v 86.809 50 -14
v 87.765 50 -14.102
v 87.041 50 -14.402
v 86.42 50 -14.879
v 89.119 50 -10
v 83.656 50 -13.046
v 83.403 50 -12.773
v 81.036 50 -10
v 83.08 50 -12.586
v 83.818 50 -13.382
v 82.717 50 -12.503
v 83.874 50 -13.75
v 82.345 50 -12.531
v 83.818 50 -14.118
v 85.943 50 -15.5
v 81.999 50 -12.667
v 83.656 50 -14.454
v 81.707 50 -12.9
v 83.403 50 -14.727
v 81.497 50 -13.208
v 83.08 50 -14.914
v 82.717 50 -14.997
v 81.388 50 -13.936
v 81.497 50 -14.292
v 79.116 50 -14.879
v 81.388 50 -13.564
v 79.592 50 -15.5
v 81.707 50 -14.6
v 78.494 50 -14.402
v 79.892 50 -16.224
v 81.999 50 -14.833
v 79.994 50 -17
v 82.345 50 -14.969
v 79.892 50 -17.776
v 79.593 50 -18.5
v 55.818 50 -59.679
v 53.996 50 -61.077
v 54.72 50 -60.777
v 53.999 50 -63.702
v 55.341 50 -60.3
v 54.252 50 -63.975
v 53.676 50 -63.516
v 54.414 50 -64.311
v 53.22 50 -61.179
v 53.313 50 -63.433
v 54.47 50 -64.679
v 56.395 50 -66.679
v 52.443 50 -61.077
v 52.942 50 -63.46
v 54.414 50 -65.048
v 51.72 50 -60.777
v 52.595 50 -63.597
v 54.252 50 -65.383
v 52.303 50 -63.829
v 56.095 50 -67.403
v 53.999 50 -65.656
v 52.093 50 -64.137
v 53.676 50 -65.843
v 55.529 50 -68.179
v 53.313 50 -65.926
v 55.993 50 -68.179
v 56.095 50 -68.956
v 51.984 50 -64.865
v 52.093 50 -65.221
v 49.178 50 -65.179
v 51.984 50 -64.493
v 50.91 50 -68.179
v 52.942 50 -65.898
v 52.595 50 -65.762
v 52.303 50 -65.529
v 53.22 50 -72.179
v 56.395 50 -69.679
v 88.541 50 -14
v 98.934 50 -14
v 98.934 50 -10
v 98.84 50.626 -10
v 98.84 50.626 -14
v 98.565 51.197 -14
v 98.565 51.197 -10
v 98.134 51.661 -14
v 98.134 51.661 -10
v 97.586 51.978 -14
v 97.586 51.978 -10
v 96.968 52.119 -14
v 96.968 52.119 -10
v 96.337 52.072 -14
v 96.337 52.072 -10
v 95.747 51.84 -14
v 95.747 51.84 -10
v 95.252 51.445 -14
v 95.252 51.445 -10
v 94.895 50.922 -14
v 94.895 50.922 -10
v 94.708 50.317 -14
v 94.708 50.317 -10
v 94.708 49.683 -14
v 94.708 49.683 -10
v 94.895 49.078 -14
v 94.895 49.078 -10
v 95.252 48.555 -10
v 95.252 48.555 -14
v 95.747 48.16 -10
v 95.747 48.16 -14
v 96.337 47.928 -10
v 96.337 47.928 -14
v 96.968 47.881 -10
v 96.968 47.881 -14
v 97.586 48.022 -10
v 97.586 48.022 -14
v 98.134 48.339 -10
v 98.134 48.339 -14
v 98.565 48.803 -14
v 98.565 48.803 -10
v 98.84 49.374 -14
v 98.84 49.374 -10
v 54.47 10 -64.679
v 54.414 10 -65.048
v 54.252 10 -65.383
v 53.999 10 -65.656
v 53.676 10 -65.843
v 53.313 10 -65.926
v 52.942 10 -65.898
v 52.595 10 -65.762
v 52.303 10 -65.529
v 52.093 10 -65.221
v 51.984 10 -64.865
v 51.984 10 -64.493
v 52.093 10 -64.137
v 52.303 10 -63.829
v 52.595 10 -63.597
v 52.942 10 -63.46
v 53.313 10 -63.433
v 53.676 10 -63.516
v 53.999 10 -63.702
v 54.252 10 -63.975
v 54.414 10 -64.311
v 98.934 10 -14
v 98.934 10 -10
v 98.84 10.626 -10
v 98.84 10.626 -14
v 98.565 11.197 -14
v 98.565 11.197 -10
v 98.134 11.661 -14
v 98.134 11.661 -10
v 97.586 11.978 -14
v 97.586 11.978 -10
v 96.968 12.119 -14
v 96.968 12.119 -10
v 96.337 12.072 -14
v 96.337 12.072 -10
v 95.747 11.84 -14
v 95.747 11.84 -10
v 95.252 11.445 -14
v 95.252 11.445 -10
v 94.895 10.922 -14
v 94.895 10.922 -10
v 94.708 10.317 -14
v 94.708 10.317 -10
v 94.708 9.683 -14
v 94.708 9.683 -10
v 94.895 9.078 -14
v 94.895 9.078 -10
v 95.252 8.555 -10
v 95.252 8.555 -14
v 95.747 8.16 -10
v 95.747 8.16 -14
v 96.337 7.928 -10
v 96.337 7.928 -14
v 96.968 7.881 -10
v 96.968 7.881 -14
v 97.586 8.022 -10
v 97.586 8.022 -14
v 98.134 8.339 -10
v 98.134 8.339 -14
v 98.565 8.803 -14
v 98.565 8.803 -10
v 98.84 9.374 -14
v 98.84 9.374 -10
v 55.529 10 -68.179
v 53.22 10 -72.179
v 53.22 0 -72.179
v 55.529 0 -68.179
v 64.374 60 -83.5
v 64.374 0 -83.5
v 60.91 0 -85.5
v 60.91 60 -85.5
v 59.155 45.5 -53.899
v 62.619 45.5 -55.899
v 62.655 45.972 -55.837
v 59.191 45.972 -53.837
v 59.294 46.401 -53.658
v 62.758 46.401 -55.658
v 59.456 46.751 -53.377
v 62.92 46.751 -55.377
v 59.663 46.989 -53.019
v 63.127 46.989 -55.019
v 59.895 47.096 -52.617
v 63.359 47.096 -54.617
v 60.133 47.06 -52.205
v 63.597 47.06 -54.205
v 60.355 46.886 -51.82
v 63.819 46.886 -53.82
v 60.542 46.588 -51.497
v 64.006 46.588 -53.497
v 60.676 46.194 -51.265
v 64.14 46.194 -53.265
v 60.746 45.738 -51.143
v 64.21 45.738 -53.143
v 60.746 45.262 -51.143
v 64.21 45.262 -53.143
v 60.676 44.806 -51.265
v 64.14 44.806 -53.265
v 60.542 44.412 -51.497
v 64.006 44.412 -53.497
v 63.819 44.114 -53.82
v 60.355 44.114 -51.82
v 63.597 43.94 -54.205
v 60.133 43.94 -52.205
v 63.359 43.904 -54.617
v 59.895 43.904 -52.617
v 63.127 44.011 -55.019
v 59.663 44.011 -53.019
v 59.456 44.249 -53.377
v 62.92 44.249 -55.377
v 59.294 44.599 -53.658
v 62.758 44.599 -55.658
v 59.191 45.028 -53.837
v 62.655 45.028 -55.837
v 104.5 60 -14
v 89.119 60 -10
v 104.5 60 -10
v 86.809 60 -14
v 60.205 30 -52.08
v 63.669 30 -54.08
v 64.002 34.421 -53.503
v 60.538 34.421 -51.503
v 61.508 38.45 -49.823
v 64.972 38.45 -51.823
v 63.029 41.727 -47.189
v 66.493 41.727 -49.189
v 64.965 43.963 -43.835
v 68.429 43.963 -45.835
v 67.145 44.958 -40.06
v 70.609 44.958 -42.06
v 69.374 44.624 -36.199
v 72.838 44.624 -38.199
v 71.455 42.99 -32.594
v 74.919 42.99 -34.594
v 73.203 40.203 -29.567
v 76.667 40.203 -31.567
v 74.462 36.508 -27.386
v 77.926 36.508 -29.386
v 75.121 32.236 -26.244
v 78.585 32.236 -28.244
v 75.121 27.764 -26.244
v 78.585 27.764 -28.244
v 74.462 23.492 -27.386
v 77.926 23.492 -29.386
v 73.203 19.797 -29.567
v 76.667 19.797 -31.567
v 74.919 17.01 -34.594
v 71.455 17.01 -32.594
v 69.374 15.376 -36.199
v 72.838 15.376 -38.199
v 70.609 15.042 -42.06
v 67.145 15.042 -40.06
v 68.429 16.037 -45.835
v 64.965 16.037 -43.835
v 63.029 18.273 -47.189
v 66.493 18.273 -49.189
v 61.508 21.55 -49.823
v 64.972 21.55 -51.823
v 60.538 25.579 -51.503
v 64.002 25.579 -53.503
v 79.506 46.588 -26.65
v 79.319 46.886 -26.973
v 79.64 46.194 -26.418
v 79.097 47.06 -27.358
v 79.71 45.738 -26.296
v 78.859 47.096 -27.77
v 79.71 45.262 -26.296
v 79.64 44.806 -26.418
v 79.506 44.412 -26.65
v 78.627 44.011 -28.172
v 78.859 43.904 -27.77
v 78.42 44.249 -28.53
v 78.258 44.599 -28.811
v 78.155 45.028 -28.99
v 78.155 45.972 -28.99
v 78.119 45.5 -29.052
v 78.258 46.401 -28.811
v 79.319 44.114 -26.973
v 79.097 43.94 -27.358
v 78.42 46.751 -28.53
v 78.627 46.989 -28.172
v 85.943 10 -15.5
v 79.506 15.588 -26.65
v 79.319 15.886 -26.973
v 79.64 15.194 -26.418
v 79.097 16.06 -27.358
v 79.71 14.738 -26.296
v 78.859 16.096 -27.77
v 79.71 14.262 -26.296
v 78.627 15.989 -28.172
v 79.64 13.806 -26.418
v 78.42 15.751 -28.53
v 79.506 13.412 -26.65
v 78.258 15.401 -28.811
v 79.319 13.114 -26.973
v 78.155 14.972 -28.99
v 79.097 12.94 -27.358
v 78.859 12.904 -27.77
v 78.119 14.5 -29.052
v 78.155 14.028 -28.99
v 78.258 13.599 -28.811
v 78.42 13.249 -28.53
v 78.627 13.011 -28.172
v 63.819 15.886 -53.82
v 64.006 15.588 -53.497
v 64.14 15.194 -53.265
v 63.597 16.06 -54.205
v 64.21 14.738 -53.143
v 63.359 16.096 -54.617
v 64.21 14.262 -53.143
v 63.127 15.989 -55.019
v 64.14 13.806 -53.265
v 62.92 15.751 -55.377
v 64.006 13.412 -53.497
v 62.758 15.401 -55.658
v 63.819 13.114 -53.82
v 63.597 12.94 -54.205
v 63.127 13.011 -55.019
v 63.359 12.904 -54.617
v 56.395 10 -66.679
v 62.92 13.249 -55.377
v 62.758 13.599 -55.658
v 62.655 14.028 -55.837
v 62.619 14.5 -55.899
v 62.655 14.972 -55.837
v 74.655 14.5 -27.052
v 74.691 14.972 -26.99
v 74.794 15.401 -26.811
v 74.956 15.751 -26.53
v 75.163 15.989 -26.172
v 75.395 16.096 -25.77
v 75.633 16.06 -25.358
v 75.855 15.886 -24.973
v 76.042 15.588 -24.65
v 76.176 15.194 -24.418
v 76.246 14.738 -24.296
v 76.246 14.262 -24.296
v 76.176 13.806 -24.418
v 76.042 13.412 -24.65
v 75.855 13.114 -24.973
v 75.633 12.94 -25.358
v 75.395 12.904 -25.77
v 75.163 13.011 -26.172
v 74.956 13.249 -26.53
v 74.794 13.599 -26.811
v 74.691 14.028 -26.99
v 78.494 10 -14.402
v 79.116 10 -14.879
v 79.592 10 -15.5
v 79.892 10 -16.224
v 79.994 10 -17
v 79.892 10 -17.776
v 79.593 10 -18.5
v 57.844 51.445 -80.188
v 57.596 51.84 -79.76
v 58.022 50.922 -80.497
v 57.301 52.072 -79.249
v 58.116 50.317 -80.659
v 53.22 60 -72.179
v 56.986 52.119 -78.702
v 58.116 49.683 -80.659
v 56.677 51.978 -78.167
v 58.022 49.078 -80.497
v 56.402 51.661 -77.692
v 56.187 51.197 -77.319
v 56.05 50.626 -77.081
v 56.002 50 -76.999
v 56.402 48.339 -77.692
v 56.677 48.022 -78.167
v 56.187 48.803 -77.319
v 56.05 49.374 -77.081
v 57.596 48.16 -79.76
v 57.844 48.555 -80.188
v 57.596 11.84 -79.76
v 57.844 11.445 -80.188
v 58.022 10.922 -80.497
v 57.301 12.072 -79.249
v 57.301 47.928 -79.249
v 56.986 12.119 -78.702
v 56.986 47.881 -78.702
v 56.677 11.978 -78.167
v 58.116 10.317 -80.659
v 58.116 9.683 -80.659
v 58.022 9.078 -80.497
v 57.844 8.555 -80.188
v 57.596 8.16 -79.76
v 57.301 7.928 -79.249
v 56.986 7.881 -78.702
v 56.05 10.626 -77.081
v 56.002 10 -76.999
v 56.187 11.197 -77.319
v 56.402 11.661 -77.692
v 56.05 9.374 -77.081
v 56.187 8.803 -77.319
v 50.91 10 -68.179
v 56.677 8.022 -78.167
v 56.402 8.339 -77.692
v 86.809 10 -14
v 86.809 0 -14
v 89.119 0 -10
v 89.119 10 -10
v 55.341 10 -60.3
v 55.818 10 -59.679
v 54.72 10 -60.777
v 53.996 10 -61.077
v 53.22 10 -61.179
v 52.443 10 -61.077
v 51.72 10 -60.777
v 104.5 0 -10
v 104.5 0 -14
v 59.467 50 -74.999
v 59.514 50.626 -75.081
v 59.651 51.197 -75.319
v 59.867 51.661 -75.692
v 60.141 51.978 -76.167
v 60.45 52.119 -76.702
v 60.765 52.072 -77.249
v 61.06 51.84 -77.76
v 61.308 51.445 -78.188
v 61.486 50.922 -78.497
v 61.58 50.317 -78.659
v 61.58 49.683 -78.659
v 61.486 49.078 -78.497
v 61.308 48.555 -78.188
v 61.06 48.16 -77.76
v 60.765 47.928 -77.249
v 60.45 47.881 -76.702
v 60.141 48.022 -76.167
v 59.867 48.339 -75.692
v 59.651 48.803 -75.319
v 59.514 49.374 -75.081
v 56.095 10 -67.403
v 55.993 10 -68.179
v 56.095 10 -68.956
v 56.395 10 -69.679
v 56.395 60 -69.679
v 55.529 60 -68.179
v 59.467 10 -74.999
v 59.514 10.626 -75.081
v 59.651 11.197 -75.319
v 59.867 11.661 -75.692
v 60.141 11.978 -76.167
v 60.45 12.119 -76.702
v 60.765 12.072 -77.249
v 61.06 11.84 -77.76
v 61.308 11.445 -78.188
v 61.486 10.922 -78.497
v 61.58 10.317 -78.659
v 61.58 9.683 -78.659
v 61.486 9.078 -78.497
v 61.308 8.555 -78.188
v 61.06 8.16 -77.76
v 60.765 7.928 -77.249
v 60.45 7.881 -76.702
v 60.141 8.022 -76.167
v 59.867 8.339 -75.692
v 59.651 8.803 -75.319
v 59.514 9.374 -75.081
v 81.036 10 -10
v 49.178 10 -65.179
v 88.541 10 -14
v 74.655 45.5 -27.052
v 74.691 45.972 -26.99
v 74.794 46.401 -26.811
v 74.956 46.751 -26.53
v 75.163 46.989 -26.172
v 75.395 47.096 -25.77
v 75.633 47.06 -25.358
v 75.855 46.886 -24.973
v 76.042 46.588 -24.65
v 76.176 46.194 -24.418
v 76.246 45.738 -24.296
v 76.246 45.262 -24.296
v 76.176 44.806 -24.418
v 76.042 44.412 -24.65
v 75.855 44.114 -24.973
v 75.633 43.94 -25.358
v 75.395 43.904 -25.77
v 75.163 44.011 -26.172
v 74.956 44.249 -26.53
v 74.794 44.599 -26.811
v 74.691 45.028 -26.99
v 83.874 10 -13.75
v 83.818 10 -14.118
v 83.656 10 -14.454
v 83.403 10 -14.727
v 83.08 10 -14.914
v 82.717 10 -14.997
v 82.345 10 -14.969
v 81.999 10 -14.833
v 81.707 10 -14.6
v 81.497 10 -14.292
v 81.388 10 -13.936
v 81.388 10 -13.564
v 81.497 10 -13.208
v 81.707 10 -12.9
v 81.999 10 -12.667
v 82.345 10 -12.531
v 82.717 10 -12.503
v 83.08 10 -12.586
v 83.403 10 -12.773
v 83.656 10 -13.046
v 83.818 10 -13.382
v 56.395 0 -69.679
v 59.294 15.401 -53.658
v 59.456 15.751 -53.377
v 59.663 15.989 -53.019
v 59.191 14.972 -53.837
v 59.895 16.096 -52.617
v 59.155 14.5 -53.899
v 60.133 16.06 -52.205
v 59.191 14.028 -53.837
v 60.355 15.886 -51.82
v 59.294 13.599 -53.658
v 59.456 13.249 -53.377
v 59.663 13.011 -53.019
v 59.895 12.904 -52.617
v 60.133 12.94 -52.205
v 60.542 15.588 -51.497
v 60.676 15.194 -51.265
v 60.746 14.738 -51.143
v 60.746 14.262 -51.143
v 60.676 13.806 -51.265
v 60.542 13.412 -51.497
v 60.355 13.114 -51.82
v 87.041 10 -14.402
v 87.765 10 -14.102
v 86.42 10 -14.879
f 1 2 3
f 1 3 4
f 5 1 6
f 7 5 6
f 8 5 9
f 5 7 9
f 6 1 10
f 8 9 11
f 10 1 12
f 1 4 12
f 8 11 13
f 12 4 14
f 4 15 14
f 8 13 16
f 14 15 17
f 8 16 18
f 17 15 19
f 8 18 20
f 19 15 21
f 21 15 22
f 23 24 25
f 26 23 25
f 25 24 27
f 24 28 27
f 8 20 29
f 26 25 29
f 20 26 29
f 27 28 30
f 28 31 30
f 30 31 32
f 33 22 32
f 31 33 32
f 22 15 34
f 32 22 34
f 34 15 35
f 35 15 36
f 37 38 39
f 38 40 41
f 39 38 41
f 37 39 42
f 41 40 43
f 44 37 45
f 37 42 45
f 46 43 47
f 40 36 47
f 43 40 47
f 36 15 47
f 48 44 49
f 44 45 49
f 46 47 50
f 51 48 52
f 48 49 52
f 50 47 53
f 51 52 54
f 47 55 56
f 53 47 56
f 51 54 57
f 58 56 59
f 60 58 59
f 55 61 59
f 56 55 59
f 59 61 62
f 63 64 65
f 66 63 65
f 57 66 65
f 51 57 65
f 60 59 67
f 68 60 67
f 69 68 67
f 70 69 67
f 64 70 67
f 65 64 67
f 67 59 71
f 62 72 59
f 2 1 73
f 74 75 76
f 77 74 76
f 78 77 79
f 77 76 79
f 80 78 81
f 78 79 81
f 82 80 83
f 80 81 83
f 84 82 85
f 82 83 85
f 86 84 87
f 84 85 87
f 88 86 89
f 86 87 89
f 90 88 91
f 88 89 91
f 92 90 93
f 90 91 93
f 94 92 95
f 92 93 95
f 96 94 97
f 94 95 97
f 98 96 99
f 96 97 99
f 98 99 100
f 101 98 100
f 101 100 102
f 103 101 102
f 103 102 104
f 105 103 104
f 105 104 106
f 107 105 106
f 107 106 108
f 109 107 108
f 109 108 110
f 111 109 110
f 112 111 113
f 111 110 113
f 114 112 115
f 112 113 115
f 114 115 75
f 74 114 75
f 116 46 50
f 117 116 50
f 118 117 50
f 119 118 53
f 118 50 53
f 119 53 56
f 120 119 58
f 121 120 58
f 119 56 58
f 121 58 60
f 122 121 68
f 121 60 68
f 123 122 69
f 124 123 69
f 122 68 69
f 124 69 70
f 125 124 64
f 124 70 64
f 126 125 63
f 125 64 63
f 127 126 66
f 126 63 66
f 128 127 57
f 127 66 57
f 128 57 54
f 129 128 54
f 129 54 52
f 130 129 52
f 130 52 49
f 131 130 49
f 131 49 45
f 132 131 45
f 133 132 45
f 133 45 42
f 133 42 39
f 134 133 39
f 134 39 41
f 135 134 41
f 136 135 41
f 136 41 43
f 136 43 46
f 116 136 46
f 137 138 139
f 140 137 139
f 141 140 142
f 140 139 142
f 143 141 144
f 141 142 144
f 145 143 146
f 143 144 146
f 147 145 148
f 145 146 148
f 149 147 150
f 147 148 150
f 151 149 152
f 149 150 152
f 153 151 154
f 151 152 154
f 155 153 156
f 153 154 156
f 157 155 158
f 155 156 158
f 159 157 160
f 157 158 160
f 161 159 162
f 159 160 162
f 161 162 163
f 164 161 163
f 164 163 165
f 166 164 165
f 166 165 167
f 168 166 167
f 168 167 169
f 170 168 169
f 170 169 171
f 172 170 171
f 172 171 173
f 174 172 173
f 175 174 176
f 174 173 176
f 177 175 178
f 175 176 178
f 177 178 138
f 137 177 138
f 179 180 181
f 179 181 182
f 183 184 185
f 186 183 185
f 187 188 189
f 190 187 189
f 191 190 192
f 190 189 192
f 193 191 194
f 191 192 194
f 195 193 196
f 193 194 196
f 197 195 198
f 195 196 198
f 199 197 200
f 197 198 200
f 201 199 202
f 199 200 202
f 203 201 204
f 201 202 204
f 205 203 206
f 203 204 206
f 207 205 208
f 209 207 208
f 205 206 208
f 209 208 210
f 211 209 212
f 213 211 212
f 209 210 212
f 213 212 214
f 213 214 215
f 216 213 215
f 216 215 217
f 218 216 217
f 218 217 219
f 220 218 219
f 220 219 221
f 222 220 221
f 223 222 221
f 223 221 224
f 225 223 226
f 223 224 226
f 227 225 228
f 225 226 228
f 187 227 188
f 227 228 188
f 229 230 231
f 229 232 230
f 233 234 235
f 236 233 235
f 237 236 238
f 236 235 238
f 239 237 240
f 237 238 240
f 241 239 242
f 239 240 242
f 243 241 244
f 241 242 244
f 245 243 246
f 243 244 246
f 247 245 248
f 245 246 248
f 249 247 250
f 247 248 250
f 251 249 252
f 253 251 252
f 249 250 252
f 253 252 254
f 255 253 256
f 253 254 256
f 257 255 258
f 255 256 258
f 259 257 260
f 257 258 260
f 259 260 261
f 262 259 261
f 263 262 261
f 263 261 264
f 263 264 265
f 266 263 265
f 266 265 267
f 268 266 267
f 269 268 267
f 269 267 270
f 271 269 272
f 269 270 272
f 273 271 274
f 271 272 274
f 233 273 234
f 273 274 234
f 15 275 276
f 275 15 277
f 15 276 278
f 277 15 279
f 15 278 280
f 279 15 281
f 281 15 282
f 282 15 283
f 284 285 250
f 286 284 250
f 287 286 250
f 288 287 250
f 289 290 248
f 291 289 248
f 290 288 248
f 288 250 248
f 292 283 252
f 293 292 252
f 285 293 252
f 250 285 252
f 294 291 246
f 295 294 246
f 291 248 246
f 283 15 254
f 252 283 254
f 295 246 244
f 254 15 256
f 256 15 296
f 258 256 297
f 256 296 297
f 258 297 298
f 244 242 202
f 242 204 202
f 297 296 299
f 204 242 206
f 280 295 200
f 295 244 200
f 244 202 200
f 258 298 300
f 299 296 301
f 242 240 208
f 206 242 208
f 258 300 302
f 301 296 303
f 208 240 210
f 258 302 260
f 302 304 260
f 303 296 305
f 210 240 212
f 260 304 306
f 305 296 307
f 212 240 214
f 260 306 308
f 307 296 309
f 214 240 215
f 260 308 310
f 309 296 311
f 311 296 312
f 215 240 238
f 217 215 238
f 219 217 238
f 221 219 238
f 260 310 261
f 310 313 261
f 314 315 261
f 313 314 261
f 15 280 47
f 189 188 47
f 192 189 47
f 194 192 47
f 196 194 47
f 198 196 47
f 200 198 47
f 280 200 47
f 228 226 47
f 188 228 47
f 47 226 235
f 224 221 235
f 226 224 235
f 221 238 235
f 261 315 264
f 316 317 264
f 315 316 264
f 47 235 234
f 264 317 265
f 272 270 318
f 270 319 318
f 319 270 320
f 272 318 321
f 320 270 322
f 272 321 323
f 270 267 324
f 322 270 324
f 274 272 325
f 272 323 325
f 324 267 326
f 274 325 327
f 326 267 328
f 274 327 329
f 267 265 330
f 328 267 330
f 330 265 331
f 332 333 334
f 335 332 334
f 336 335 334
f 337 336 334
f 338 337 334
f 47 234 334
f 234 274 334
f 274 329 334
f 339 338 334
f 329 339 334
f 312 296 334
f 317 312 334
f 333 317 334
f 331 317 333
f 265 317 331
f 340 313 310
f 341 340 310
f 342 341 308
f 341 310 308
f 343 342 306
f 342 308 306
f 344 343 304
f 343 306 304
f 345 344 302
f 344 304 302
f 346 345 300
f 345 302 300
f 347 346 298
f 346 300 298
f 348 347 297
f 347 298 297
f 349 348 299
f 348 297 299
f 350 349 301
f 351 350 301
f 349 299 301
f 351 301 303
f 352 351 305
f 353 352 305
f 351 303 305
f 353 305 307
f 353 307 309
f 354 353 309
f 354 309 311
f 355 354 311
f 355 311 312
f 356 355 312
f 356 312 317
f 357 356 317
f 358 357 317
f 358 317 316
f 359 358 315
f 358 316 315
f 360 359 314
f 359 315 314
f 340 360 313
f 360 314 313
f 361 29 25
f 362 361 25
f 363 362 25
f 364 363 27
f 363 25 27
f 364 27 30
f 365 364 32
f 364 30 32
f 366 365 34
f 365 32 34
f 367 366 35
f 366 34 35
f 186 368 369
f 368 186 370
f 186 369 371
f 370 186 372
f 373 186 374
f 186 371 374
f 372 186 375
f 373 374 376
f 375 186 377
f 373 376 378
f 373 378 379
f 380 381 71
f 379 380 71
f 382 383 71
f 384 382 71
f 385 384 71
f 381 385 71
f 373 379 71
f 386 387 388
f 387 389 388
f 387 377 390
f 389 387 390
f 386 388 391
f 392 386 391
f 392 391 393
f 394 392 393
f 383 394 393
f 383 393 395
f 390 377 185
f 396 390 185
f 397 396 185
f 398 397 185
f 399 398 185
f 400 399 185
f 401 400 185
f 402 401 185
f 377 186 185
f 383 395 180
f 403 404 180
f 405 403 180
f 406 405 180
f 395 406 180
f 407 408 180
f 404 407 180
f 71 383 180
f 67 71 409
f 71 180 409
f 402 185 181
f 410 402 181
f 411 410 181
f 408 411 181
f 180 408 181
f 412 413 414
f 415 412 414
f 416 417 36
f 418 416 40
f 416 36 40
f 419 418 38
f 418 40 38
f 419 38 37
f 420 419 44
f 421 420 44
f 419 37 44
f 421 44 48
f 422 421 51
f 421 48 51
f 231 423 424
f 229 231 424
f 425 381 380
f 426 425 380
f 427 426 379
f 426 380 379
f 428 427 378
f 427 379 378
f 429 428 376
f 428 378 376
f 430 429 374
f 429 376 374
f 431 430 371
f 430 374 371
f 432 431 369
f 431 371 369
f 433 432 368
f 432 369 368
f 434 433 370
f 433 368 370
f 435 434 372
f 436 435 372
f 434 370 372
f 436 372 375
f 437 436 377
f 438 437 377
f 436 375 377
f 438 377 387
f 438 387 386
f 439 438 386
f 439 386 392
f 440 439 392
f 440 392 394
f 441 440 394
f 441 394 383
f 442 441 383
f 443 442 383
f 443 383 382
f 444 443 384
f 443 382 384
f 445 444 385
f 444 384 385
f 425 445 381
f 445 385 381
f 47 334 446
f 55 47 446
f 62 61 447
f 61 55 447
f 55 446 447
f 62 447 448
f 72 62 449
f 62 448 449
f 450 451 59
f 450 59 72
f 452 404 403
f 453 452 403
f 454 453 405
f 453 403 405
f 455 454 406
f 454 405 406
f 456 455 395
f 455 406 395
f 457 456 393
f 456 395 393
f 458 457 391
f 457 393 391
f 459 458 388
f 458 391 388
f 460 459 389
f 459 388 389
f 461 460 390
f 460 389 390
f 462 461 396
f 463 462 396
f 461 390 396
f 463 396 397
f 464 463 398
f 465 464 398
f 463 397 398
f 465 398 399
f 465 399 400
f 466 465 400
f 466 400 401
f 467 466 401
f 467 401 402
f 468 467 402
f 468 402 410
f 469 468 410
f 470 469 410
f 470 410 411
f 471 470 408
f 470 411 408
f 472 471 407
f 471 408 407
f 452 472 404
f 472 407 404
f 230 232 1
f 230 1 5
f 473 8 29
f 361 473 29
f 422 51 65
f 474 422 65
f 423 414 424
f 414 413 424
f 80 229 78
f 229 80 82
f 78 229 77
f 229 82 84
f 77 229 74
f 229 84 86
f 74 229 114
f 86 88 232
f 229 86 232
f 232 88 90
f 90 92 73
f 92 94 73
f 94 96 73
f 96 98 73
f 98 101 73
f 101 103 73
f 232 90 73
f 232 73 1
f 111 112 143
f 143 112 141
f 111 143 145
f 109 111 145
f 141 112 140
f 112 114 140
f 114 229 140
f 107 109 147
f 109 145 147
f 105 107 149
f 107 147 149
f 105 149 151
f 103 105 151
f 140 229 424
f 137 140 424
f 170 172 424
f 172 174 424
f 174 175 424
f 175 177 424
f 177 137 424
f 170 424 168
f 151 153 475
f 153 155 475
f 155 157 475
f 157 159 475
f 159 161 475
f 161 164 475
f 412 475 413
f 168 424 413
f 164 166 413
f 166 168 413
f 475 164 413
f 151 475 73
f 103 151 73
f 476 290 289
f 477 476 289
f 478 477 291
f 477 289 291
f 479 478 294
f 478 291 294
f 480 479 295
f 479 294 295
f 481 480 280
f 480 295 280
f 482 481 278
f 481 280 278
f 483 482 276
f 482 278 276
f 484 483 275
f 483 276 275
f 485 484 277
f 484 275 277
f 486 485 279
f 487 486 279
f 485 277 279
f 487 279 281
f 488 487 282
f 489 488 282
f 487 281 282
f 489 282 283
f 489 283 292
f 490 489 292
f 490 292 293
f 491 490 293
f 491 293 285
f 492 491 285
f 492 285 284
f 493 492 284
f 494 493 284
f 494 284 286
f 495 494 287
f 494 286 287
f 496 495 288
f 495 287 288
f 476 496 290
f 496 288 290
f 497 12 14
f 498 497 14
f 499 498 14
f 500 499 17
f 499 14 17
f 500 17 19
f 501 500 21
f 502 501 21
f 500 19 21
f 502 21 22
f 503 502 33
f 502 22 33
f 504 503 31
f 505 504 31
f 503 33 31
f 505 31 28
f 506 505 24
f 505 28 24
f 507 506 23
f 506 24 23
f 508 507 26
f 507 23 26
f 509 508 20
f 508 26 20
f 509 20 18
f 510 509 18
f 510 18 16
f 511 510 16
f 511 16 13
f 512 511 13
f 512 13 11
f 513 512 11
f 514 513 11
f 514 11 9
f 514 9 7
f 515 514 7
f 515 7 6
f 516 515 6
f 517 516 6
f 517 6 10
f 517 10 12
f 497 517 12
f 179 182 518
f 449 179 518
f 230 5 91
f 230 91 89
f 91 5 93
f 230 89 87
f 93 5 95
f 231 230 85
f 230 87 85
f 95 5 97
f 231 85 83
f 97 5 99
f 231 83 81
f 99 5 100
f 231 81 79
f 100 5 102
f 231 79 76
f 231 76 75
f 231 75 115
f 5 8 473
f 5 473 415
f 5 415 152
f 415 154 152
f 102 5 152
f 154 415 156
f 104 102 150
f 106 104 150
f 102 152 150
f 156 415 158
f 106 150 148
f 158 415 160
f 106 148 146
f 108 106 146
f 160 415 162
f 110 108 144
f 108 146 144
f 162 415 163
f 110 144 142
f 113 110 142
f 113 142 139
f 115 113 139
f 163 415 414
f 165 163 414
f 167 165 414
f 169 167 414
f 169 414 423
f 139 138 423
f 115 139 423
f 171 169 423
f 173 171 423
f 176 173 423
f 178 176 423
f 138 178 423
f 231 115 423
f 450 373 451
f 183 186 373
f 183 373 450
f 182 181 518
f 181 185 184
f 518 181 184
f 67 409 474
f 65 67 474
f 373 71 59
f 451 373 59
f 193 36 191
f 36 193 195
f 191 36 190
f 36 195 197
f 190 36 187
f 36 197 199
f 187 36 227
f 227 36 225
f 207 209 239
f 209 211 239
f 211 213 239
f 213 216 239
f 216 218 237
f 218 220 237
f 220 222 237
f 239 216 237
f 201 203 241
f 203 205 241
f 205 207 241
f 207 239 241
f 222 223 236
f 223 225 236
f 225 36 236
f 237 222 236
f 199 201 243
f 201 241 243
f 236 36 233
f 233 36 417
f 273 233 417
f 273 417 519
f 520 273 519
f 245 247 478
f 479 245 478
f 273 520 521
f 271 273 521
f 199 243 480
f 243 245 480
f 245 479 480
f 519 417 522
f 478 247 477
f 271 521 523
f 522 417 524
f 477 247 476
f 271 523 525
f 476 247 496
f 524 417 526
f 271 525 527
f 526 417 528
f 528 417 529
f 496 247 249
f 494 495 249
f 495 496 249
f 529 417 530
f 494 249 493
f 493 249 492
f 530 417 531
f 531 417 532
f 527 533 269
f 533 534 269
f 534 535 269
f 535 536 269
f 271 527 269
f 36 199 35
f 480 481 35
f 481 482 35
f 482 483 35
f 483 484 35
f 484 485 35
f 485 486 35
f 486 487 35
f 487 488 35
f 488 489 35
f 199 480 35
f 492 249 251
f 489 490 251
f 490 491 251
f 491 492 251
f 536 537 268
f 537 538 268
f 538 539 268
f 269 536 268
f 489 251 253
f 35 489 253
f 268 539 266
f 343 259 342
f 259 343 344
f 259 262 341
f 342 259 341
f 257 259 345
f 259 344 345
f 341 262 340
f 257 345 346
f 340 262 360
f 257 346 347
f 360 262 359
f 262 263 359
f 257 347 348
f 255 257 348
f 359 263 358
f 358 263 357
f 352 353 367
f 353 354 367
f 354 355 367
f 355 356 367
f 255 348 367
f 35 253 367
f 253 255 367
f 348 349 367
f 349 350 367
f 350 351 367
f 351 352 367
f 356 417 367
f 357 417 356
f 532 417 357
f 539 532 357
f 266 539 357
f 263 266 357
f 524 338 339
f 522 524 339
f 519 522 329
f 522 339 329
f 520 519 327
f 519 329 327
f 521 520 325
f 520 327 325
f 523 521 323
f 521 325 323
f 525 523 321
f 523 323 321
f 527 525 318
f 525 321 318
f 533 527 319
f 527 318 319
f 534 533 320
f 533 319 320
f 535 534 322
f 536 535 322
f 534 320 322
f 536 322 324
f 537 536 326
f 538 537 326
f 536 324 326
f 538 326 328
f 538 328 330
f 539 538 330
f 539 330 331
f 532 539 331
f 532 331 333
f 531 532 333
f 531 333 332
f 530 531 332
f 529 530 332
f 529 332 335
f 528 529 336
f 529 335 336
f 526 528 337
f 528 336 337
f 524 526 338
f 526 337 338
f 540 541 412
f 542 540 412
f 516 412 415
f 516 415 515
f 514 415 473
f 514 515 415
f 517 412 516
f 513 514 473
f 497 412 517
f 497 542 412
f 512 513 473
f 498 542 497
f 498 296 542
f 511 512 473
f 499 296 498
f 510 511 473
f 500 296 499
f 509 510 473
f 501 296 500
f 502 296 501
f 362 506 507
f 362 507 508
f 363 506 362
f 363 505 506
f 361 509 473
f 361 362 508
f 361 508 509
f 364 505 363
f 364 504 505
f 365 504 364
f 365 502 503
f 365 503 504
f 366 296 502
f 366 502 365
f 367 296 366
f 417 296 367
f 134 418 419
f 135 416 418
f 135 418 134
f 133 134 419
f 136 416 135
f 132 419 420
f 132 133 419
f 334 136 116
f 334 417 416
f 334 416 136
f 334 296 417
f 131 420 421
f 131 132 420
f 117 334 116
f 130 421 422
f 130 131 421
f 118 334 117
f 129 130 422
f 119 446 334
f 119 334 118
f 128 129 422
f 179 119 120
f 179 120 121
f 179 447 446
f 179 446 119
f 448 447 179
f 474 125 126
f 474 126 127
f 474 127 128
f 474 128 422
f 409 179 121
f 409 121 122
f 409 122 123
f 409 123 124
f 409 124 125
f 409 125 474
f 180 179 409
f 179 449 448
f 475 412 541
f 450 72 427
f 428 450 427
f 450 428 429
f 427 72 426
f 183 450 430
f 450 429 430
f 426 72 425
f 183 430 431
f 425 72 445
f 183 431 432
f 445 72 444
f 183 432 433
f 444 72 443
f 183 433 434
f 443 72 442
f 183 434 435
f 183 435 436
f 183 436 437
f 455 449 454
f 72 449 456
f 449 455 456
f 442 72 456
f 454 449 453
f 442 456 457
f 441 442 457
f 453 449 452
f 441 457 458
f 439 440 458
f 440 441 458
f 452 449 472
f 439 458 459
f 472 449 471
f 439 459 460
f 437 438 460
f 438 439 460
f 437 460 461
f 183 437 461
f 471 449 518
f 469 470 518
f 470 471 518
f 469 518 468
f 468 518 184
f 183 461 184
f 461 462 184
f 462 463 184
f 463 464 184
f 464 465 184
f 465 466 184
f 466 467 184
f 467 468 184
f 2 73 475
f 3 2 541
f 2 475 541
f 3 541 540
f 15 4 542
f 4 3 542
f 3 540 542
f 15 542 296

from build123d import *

# Parameters (mm, degrees)
BOSS_EXTRUDE4_DEPTH = 60
CUT_EXTRUDE9_DEPTH  = 10
FILLET5_R           = 3
SKETCH13_R          = 1.25
CUT_EXTRUDE10_DEPTH = 51
SKETCH14_R          = 2.125
CUT_EXTRUDE11_DEPTH = 4
SKETCH15_R          = 2.125
CUT_EXTRUDE12_DEPTH = 4
SKETCH16_R          = 15
SKETCH16_R_2        = 1.6
CUT_EXTRUDE13_DEPTH = 4
CUT_EXTRUDE14_DEPTH = 40


with BuildPart() as part:
    # Sketch1 → Boss-Extrude4 (new body)
    with BuildSketch(Plane(origin=(0, 0, 0), x_dir=(1, 0, 0), z_dir=(0, 1, 0))):
        with BuildLine():
            Line((84.5, 10), (104.5, 10))
            Line((104.5, 10), (104.5, 14))
            Line((104.5, 14), (88.541451884, 14))
            ThreePointArc((88.541451884, 14), (87.041451884, 14.401923789), (85.943375673, 15.5))
            Line((85.943375673, 15.5), (56.395081595, 66.67914662))
            ThreePointArc((56.395081595, 66.67914662), (55.993157806, 68.17914662), (56.395081595, 69.67914662))
            Line((56.395081595, 69.67914662), (64.374355653, 83.499654695))
            Line((64.374355653, 83.499654695), (60.910254038, 85.499654695))
            Line((60.910254038, 85.499654695), (50.910254038, 68.17914662))
            Line((50.910254038, 68.17914662), (46.868804038, 61.179149884))
            Line((46.868804038, 61.179149884), (49.178205115, 57.179149884))
            Line((49.178205115, 57.179149884), (53.219655115, 64.17914662))
            Line((53.219655115, 64.17914662), (82.190598923, 14))
            Line((82.190598923, 14), (74.107698923, 14))
            Line((74.107698923, 14), (76.4171, 10))
            Line((76.4171, 10), (84.5, 10))
        make_face()
    extrude(amount=BOSS_EXTRUDE4_DEPTH)

    # Sketch12 → Cut-Extrude9 (cut)
    with BuildSketch(Plane(origin=(0, 60, 0), x_dir=(1, 0, 0), z_dir=(0, 1, 0))):
        with BuildLine():
            Line((89.118802154, 10), (76.4171, 10))
            Line((76.4171, 10), (46.868804038, 61.179149884))
            Line((46.868804038, 61.179149884), (53.219655115, 72.17914662))
            Line((53.219655115, 72.17914662), (55.529056191, 68.17914662))
            Line((55.529056191, 68.17914662), (56.395081595, 69.67914662))
            ThreePointArc((56.395081595, 69.67914662), (55.993157806, 68.17914662), (56.395081595, 66.67914662))
            Line((56.395081595, 66.67914662), (85.943375673, 15.5))
            ThreePointArc((85.943375673, 15.5), (87.041451884, 14.401923789), (88.541451884, 14))
            Line((88.541451884, 14), (86.809401077, 14))
            Line((86.809401077, 14), (89.118802154, 10))
        make_face()
    cut_extrude9 = extrude(amount=-CUT_EXTRUDE9_DEPTH, mode=Mode.SUBTRACT)

    # Mirror4: Cut-Extrude9 across plane
    add(cut_extrude9.mirror(Plane.ZX.offset(30)), mode=Mode.SUBTRACT)

    # Fillet5
    fillet5_edges = [part.edges().sort_by_distance(p)[0] for p in [
        (82.190598923, 30, -14),
        (53.219655115, 30, -64.17914662),
    ]]
    fillet(fillet5_edges, radius=FILLET5_R)

    # Sketch13 → Cut-Extrude10 (cut, through all)
    with BuildSketch(Plane(origin=(0, 50, 0), x_dir=(1, 0, 0), z_dir=(0, 1, 0))):
        with Locations((53.2197, 64.6791)):
            Circle(SKETCH13_R)
        with Locations((82.6236, 13.75)):
            Circle(SKETCH13_R)
    extrude(amount=-CUT_EXTRUDE10_DEPTH, mode=Mode.SUBTRACT)

    # Sketch14 → Cut-Extrude11 (cut)
    with BuildSketch(Plane.XY.offset(-10)):
        with Locations((96.809401077, 50)):
            Circle(SKETCH14_R)
        with Locations((96.809401077, 10)):
            Circle(SKETCH14_R)
    extrude(amount=-CUT_EXTRUDE11_DEPTH, mode=Mode.SUBTRACT)

    # Sketch15 → Cut-Extrude12 (cut)
    with BuildSketch(Plane(origin=(8.660254038, 0, 5), x_dir=(-0.5, 0, 0.866025404), z_dir=(-0.866025404, 0, -0.5))):
        with Locations((-96.809401077, 50)):
            Circle(SKETCH15_R)
        with Locations((-96.809401077, 10)):
            Circle(SKETCH15_R)
    extrude(amount=-CUT_EXTRUDE12_DEPTH, mode=Mode.SUBTRACT)

    # Sketch16 → Cut-Extrude13 (cut)
    with BuildSketch(Plane(origin=(71.169228634, 0, -41.08957331), x_dir=(-0.5, 0, -0.866025404), z_dir=(0.866025404, 0, -0.5))):
        with Locations((0, 30)):
            Circle(SKETCH16_R)
        with Locations((-15.5, 45.5)):
            Circle(SKETCH16_R_2)
        with Locations((15.5, 45.5)):
            Circle(SKETCH16_R_2)
        with Locations((15.5, 14.5)):
            Circle(SKETCH16_R_2)
        with Locations((-15.5, 14.5)):
            Circle(SKETCH16_R_2)
    extrude(amount=-CUT_EXTRUDE13_DEPTH, mode=Mode.SUBTRACT)

    # Sketch17 → Cut-Extrude14 (cut)
    with BuildSketch(Plane(origin=(0, 50, 0), x_dir=(1, 0, 0), z_dir=(0, 1, 0))):
        Polygon((46.868804038, 61.179149884), (76.4171, 10), (81.0358, 10), (49.178154038, 65.179061416), align=None)
    extrude(amount=-CUT_EXTRUDE14_DEPTH, mode=Mode.SUBTRACT)


solid = part.part
